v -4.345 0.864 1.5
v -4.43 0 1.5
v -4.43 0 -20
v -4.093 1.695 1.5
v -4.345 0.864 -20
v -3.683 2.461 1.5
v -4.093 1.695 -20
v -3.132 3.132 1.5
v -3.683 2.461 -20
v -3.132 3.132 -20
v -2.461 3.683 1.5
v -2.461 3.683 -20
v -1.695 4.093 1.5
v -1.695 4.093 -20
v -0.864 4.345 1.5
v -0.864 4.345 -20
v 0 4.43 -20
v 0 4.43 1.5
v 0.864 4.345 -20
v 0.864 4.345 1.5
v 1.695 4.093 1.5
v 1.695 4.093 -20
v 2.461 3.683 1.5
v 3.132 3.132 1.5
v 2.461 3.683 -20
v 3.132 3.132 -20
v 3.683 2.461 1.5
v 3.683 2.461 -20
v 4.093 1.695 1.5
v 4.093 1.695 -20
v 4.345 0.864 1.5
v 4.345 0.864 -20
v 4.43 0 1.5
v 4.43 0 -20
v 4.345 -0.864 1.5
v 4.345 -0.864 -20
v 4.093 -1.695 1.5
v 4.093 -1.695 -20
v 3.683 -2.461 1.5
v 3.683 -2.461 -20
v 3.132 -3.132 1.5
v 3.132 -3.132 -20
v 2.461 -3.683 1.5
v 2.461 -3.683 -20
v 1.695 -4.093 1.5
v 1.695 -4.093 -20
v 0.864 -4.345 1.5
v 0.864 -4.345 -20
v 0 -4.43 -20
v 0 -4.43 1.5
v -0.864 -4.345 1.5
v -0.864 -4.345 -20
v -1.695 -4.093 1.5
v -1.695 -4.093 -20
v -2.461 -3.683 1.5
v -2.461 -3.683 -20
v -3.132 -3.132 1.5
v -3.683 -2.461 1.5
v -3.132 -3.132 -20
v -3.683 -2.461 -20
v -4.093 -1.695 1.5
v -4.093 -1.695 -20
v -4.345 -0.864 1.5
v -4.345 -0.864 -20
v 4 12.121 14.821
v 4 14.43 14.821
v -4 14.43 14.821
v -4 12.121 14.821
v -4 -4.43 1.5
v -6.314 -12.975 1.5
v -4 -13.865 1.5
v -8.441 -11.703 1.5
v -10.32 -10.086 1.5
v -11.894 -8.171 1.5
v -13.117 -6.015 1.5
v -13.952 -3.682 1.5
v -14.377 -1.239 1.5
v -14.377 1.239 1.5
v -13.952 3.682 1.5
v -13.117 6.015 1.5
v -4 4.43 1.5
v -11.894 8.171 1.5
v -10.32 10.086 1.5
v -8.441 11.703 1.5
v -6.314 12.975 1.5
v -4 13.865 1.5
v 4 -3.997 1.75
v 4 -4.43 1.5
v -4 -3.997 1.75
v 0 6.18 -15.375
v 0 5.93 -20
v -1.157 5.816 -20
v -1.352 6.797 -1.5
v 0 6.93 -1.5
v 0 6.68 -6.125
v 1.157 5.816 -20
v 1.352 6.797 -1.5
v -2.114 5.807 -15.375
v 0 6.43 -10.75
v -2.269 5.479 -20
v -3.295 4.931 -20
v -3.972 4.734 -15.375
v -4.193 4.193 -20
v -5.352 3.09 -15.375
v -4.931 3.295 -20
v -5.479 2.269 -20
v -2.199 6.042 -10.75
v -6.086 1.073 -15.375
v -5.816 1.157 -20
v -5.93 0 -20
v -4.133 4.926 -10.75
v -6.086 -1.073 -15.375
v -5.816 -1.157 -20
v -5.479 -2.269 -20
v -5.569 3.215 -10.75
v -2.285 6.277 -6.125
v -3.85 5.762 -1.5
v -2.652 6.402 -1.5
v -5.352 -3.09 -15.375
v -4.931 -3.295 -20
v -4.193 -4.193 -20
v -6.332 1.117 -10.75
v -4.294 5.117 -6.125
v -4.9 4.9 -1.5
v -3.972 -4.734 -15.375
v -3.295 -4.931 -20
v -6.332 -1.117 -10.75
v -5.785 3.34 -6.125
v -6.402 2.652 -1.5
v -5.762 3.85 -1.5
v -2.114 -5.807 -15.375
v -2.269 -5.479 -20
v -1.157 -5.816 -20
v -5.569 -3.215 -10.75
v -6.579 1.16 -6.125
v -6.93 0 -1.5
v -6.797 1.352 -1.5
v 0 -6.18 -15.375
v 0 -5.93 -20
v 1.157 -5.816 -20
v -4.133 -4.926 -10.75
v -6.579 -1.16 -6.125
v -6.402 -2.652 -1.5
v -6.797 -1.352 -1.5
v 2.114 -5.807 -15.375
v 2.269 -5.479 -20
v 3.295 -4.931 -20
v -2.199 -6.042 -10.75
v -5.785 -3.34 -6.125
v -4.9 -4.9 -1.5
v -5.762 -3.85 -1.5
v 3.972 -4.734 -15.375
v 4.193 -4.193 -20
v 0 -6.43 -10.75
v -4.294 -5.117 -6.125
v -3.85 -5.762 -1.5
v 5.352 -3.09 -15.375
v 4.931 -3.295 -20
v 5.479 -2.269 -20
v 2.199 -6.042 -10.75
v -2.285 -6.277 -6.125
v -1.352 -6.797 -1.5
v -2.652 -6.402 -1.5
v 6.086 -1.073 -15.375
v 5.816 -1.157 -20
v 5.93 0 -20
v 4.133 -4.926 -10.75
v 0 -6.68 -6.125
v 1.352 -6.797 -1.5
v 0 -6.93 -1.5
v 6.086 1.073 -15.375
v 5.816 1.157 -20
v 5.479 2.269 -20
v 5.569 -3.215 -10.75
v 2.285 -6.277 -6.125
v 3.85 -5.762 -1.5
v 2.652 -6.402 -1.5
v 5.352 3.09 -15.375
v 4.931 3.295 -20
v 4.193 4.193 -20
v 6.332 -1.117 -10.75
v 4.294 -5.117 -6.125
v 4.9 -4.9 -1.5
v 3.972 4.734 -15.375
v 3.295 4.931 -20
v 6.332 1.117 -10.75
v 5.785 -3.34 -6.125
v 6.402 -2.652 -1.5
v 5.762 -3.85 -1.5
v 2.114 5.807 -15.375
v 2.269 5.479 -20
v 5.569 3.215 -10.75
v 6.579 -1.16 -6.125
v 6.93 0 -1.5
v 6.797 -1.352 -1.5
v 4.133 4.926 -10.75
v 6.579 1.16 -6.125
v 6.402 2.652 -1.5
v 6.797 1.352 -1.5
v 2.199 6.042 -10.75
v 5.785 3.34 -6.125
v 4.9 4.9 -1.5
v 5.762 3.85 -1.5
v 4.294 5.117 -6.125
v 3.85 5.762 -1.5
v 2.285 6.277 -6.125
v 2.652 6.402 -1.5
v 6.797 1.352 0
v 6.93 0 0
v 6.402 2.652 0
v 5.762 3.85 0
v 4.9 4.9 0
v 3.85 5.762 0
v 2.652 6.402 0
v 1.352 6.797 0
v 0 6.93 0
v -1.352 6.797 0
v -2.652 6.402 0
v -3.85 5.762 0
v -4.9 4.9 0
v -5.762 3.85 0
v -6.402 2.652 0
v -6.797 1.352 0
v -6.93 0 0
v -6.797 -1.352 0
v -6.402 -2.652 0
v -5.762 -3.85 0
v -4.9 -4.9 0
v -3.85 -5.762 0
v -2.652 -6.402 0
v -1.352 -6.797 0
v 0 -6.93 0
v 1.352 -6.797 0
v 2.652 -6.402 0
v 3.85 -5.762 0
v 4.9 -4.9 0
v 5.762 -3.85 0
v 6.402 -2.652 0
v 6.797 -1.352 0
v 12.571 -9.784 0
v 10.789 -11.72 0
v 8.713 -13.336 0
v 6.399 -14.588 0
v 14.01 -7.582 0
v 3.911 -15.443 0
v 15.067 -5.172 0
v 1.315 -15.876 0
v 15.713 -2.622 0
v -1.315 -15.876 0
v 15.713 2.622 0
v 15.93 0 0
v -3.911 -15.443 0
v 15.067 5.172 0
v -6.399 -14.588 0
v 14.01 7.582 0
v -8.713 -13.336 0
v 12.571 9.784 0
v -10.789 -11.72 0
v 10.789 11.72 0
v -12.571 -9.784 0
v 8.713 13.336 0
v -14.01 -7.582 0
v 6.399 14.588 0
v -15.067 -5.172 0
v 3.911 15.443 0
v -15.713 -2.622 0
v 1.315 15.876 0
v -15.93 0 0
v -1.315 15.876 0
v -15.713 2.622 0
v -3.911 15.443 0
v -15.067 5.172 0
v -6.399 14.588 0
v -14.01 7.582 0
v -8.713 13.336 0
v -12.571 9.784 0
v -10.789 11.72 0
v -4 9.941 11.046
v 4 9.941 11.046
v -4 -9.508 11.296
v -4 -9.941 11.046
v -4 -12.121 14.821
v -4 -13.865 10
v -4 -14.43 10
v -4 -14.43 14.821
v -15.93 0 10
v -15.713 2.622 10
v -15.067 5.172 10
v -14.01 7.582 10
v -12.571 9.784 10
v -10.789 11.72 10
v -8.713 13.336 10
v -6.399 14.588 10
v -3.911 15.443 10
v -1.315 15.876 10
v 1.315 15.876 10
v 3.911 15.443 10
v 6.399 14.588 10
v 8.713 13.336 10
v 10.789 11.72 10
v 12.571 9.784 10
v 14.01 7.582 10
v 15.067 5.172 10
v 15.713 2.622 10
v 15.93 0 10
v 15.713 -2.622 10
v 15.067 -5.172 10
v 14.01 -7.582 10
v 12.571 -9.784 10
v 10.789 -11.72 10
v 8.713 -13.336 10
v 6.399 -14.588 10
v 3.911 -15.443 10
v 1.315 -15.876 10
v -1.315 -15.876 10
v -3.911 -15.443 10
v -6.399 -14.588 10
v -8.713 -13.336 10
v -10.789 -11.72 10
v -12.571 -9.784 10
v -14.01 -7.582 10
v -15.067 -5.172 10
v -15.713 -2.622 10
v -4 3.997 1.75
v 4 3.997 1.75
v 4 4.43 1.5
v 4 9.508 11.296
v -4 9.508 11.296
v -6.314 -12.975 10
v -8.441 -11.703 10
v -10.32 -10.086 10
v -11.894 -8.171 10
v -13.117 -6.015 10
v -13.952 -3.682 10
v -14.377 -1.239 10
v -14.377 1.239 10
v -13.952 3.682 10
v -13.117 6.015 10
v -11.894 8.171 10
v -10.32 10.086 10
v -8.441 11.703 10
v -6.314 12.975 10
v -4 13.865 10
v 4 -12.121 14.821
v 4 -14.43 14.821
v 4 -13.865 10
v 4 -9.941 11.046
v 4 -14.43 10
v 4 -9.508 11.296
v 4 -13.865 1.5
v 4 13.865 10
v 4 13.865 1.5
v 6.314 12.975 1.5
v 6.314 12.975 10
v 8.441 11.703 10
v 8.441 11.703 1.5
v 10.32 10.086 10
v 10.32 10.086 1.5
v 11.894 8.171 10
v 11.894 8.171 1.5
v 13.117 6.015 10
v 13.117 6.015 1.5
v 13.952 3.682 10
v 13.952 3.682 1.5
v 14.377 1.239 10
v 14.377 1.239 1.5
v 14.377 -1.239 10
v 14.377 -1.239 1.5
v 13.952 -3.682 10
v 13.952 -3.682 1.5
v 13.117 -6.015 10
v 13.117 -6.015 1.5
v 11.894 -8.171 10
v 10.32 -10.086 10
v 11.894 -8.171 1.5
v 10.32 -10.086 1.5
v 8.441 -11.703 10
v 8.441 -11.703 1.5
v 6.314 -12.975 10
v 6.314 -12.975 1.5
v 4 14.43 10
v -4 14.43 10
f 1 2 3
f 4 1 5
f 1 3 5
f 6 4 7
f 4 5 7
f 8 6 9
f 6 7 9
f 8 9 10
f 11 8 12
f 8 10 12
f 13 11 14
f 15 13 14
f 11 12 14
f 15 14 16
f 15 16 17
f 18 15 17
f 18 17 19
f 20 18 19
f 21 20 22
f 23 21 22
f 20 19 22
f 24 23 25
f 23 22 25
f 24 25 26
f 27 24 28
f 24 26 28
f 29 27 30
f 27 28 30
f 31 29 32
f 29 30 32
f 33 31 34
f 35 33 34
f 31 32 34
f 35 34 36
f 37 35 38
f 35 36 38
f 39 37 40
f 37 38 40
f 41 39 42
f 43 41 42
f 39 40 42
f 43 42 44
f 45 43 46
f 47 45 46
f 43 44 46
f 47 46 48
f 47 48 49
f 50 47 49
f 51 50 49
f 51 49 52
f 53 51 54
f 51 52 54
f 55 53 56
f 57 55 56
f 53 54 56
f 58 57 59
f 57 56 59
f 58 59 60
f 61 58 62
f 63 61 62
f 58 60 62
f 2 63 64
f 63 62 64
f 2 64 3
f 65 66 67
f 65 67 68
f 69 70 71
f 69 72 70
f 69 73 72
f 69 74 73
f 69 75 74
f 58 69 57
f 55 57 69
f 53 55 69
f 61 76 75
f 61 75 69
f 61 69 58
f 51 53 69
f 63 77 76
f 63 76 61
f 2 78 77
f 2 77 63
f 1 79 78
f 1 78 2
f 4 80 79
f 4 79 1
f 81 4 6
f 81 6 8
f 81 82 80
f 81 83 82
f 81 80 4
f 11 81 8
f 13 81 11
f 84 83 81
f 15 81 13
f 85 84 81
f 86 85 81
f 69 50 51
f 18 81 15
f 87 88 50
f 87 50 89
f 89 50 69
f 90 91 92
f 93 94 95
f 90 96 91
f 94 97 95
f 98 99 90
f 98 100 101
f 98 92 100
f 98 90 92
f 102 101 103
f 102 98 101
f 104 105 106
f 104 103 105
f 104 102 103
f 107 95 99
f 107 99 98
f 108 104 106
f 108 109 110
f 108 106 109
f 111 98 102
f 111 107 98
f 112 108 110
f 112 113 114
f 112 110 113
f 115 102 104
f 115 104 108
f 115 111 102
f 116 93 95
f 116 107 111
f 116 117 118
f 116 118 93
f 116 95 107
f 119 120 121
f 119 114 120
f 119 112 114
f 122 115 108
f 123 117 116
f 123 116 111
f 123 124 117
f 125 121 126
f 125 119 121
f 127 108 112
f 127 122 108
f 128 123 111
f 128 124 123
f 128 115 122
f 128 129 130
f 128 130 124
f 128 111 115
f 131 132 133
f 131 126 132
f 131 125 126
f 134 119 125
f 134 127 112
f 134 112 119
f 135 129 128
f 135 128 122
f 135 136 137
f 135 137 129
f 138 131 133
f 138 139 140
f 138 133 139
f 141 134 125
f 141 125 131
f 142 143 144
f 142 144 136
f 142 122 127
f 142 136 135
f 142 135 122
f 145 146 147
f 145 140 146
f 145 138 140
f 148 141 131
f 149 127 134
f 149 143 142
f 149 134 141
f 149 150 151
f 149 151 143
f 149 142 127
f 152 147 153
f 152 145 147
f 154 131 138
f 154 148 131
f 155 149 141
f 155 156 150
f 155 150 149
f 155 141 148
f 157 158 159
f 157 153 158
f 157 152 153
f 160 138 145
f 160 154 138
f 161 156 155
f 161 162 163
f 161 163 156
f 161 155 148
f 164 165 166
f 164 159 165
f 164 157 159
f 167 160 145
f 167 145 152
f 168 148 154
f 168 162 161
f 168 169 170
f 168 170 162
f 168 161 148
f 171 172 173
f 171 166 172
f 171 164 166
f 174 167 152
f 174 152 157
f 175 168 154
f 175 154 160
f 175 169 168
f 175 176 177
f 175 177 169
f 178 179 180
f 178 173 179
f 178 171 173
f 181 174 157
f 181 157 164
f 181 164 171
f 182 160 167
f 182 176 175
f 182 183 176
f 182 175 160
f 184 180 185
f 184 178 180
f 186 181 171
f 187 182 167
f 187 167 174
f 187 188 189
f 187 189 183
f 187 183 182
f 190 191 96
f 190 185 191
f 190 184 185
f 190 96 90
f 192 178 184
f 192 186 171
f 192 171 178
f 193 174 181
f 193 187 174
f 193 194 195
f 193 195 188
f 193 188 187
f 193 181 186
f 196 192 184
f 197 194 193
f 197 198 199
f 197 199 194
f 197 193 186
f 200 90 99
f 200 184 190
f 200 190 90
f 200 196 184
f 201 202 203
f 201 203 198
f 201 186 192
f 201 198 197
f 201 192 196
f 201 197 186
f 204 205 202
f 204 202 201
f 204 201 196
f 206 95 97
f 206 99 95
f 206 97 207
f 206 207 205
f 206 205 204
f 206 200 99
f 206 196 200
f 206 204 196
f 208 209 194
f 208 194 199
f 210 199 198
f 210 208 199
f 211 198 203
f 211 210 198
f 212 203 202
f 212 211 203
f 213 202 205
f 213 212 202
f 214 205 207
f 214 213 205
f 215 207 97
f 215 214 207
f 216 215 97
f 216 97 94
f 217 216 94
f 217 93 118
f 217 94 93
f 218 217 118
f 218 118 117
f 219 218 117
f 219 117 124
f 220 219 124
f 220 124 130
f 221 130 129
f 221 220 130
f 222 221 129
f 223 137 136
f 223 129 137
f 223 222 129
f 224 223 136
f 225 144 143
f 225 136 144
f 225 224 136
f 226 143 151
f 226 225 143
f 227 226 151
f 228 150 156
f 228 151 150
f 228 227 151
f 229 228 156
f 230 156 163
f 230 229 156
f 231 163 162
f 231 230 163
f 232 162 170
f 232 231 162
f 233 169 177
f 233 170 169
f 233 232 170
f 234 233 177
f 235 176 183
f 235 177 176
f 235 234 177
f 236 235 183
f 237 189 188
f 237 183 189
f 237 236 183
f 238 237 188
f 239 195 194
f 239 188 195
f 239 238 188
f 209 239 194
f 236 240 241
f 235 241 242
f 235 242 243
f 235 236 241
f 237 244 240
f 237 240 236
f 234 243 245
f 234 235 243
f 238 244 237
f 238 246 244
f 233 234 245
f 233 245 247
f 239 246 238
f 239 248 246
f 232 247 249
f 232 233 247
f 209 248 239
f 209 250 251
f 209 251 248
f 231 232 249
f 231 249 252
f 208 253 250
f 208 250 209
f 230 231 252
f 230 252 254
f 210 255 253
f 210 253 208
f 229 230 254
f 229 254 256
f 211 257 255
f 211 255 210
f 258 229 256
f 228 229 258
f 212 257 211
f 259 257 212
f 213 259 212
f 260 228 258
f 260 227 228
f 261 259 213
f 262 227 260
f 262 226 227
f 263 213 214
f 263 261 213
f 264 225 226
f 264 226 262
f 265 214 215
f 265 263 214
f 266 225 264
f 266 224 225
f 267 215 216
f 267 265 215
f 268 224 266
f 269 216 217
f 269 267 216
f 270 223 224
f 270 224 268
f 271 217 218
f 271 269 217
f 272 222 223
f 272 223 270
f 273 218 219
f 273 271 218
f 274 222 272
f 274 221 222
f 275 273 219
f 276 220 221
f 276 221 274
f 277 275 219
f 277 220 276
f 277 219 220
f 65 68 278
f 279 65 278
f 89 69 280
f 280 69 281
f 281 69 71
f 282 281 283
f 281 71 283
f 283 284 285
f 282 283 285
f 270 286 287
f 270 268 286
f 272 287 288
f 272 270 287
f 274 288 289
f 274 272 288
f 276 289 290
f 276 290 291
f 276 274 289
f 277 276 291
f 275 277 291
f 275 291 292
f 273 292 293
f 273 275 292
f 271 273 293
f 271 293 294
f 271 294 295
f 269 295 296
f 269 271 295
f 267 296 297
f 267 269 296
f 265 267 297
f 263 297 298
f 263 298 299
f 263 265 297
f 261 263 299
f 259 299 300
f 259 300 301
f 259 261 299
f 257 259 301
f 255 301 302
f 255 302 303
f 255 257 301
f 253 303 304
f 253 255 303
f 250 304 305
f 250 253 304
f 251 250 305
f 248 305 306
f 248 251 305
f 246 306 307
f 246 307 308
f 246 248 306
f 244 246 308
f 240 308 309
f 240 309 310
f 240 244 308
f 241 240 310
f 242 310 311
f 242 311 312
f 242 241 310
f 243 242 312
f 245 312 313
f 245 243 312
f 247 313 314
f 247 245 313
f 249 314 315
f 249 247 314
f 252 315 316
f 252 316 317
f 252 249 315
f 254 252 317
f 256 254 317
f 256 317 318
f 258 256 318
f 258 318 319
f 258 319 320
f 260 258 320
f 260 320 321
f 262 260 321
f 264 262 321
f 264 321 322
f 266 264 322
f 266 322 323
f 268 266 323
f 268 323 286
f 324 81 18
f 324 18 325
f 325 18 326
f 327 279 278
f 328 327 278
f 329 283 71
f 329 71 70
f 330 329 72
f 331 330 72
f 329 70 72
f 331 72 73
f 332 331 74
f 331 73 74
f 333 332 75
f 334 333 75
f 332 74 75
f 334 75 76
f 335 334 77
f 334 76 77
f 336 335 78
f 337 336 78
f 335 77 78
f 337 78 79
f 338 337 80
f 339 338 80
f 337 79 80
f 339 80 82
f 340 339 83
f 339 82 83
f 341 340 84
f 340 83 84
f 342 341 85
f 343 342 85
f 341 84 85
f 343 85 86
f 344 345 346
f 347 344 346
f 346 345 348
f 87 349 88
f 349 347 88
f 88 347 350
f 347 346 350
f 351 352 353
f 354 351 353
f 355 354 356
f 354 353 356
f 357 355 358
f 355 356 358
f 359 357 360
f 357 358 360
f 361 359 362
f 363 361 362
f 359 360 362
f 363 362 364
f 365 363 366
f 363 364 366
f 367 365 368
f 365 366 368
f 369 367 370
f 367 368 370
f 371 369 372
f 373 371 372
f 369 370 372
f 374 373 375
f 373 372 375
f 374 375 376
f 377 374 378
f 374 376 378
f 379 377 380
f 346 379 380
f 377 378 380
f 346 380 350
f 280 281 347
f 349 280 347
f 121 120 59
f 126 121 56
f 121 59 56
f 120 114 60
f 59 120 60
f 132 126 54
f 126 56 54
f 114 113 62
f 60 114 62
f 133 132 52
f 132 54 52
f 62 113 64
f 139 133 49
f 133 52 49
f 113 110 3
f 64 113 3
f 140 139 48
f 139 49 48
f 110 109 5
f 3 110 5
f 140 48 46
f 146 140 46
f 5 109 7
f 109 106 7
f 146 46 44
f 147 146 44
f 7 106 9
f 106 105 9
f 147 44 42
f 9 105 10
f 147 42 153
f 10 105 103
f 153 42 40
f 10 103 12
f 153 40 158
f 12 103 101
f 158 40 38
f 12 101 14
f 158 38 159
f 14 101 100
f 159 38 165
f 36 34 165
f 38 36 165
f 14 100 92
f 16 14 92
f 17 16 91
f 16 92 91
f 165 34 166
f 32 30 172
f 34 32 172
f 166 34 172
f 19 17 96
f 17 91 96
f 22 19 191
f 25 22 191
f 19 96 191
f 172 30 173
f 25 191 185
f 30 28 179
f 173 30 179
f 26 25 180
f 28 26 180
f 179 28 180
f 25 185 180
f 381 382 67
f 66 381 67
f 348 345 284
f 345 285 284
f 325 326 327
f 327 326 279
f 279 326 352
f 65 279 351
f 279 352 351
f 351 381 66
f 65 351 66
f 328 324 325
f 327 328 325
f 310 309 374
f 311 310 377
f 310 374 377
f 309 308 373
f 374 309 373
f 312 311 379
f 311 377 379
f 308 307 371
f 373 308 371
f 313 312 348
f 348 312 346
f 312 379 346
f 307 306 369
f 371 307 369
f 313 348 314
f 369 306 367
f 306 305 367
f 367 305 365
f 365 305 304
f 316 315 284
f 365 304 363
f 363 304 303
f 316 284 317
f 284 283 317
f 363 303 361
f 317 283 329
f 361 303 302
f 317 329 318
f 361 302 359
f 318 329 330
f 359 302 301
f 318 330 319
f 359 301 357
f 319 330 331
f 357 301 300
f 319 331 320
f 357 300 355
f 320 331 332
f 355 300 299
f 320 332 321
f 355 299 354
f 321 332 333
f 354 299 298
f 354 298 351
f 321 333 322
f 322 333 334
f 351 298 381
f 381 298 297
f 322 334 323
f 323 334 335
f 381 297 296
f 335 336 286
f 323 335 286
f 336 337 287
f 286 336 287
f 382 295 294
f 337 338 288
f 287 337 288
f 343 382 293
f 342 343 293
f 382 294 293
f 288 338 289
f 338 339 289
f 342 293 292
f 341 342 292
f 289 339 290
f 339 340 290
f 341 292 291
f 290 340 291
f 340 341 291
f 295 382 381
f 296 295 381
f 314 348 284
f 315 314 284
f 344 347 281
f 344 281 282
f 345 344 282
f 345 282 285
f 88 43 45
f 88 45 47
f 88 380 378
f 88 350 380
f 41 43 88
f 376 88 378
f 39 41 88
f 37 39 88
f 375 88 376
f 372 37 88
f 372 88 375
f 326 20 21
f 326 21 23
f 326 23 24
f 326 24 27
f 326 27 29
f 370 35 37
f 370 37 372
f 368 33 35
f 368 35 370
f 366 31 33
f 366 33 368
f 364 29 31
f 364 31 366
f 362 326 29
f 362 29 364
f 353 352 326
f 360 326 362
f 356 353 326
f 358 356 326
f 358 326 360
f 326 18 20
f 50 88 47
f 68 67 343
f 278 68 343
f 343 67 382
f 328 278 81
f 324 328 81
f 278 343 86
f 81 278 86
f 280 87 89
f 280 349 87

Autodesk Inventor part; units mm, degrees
ref_plane "YZ Plane" through (0, 0, 0) normal (1, 0, 0) x (0, 1, 0)
ref_plane "XZ Plane" through (0, 0, 0) normal (0, 1, 0) x (-1, 0, 0)
ref_plane "XY Plane" through (0, 0, 0) normal (0, 0, 1) x (1, 0, 0)
sketch "Sketch1" plane through (0, 0, 0) normal (0, 0, 1) x (1, 0, 0)
  circle A0 centre (0, 0) radius 6.94 construction
  circle A1 centre (0, 0) radius 6.93
  point P0 (0, 0)
  dimension "d0" = 0.01
sketch "Sketch1 outline for Extrusion1" plane through (0, 0, 0) normal (0, 0, 1) x (1, 0, 0)
  circle A0 centre (0, 0) radius 6.93
extrude "Extrusion1" add sketch "Sketch1 outline for Extrusion1" against normal blind 20
sketch "Sketch2" plane through (0, 0, 0) normal (1, 0, 0) x (0, 1, 0)
  line L0 (-6.93, -20) -> (6.93, -20) construction
  line L1 (-6.93, 0) -> (6.93, 0) construction
  line L2 (6.93, -20) -> (6.93, -1.5)
  line L3 (6.93, -1.5) -> (5.93, -20)
  line L4 (6.93, -20) -> (5.93, -20)
  line L5 (0, 4) -> (0, -24) projected
  point P0 (0, 0)
  dimension "d3" = 1.5
  dimension "d4" = 1
sketch "Sketch2 outline for Revolution1" plane through (0, 0, 0) normal (1, 0, 0) x (0, 1, 0)
  line L0 (5.93, -20) -> (6.93, -20)
  line L1 (6.93, -1.5) -> (5.93, -20)
  line L2 (6.93, -20) -> (6.93, -1.5)
revolve "Revolution1" cut sketch "Sketch2 outline for Revolution1" angle 360 about axis through (0, 0, 0) along (0, 0, -1)
sketch "Sketch3" plane through (0, 0, 0) normal (0, 0, 1) x (1, 0, 0)
  circle A0 centre (0, 0) radius 6.93 construction
  circle A1 centre (0, 0) radius 14.43
  dimension "d6" = 7.5
sketch "Sketch3 outline for Extrusion2" plane through (0, 0, 0) normal (0, 0, 1) x (1, 0, 0)
  circle A0 centre (0, 0) radius 14.43
extrude "Extrusion2" add sketch "Sketch3 outline for Extrusion2" along normal blind 1.5
sketch "Sketch4" plane through (0, 0, -20) normal (0, 0, -1) x (-1, 0, 0)
  circle A0 centre (0, 0) radius 5.93 construction
  circle A1 centre (0, 0) radius 4.43
  dimension "d9" = 1.5
sketch "Sketch4 outline for Extrusion3" plane through (0, 0, -20) normal (0, 0, -1) x (-1, 0, 0)
  circle A0 centre (0, 0) radius 4.43
extrude "Extrusion3" cut sketch "Sketch4 outline for Extrusion3" against normal through all
sketch "Sketch5" plane through (0, 0, 0) normal (1, 0, 0) x (0, 1, 0)
  line L0 (-4.43, 1.5) -> (4.43, 1.5) construction
  line L1 (14.43, 1.5) -> (-14.43, 1.5) construction
  line L2 (4.43, 1.5) -> (14.43, 1.5)
  line L3 (14.43, 1.5) -> (14.43, 18.820508)
  line L4 (14.43, 18.820508) -> (4.43, 1.5)
  point P0 (0, 0)
  dimension "d15" = 60
sketch "Sketch5 outline for Extrusion4" plane through (0, 0, 0) normal (1, 0, 0) x (0, 1, 0)
  line L0 (14.43, 18.820508) -> (4.43, 1.5)
  line L1 (14.43, 1.5) -> (14.43, 18.820508)
  line L2 (4.43, 1.5) -> (14.43, 1.5)
extrude "Extrusion4" add sketch "Sketch5 outline for Extrusion4" along normal mid plane 8
ref_plane "Work Plane1" through (0, 4.43, 1.5) normal (0, 0.5, 0.8660254) x (-1, 0, 0)
sketch "Sketch6" plane through (-4, 14.43, 18.820508) normal (0, -0.8660254, 0.5) x (1, 0, 0)
  line L0 (0, -20) -> (0, 0)
  line L1 (0.50115, -8.72775) -> (7.50139, -8.72775)
  line L2 (8, -20) -> (0, -20)
  line L3 (0, -20) -> (0, -8.97775)
  line L4 (0, -8.97775) -> (8, -8.97775)
  line L5 (8, -8.97775) -> (8, -20)
  point P0 (4, -23.514038)
  dimension "d16" = 0.25
sketch "Sketch6 outline for Extrusion5" plane through (-4, 14.43, 18.820508) normal (0, -0.8660254, 0.5) x (1, 0, 0)
  line L0 (0, -20) -> (8, -20)
  line L1 (0, -8.97775) -> (0, -20)
  line L2 (8, -8.97775) -> (0, -8.97775)
  line L3 (8, -20) -> (8, -8.97775)
extrude "Extrusion5" add sketch "Sketch6 outline for Extrusion5" along normal blind 0.5
sketch "Sketch7" plane through (4, 0, 0) normal (1, 0, 0) x (0, 0, -1)
  line L0 (-1.5, 14.43) -> (-18.820508, 14.43) construction
  line L1 (-18.820508, 14.43) -> (-11.045549, 9.941125) construction
  line L2 (-18.820508, 14.43) -> (-14.820508, 14.43)
  line L3 (-18.820508, 14.43) -> (-14.820508, 12.120599)
  line L4 (-14.820508, 14.43) -> (-14.820508, 12.120599)
  point P0 (0, 0)
  dimension "d19" = 4
sketch "Sketch7 outline for Extrusion6" plane through (4, 0, 0) normal (1, 0, 0) x (0, 0, -1)
  line L0 (-18.820508, 14.43) -> (-14.820508, 14.43)
  line L1 (-14.820508, 14.43) -> (-14.820508, 12.120599)
  line L2 (-14.820508, 12.120599) -> (-18.820508, 14.43)
extrude "Extrusion6" cut sketch "Sketch7 outline for Extrusion6" against normal up to surface (8 mm away)
sketch "Sketch8" plane through (0, 0, 0) normal (0, 0, -1) x (-1, 0, 0)
  circle A0 centre (0, 0) radius 14.43 construction
  circle A1 centre (0, 0) radius 6.93 construction
  circle A2 centre (0, 0) radius 14.43
  circle A3 centre (0, 0) radius 15.93
  dimension "d22" = 0
  dimension "d23" = 1.5
sketch "Sketch8 outline for Extrusion7" plane through (0, 0, 0) normal (0, 0, -1) x (-1, 0, 0)
  circle A0 centre (0, 0) radius 15.93
  circle A1 centre (0, 0) radius 14.43
extrude "Extrusion7" add sketch "Sketch8 outline for Extrusion7" against normal blind 10
mirror "Mirror1" about plane through (0, 0, 0) normal (0, 1, 0) of "Extrusion4", "Extrusion5", "Extrusion6"
properties part number "ECoG_holder_3p0"
